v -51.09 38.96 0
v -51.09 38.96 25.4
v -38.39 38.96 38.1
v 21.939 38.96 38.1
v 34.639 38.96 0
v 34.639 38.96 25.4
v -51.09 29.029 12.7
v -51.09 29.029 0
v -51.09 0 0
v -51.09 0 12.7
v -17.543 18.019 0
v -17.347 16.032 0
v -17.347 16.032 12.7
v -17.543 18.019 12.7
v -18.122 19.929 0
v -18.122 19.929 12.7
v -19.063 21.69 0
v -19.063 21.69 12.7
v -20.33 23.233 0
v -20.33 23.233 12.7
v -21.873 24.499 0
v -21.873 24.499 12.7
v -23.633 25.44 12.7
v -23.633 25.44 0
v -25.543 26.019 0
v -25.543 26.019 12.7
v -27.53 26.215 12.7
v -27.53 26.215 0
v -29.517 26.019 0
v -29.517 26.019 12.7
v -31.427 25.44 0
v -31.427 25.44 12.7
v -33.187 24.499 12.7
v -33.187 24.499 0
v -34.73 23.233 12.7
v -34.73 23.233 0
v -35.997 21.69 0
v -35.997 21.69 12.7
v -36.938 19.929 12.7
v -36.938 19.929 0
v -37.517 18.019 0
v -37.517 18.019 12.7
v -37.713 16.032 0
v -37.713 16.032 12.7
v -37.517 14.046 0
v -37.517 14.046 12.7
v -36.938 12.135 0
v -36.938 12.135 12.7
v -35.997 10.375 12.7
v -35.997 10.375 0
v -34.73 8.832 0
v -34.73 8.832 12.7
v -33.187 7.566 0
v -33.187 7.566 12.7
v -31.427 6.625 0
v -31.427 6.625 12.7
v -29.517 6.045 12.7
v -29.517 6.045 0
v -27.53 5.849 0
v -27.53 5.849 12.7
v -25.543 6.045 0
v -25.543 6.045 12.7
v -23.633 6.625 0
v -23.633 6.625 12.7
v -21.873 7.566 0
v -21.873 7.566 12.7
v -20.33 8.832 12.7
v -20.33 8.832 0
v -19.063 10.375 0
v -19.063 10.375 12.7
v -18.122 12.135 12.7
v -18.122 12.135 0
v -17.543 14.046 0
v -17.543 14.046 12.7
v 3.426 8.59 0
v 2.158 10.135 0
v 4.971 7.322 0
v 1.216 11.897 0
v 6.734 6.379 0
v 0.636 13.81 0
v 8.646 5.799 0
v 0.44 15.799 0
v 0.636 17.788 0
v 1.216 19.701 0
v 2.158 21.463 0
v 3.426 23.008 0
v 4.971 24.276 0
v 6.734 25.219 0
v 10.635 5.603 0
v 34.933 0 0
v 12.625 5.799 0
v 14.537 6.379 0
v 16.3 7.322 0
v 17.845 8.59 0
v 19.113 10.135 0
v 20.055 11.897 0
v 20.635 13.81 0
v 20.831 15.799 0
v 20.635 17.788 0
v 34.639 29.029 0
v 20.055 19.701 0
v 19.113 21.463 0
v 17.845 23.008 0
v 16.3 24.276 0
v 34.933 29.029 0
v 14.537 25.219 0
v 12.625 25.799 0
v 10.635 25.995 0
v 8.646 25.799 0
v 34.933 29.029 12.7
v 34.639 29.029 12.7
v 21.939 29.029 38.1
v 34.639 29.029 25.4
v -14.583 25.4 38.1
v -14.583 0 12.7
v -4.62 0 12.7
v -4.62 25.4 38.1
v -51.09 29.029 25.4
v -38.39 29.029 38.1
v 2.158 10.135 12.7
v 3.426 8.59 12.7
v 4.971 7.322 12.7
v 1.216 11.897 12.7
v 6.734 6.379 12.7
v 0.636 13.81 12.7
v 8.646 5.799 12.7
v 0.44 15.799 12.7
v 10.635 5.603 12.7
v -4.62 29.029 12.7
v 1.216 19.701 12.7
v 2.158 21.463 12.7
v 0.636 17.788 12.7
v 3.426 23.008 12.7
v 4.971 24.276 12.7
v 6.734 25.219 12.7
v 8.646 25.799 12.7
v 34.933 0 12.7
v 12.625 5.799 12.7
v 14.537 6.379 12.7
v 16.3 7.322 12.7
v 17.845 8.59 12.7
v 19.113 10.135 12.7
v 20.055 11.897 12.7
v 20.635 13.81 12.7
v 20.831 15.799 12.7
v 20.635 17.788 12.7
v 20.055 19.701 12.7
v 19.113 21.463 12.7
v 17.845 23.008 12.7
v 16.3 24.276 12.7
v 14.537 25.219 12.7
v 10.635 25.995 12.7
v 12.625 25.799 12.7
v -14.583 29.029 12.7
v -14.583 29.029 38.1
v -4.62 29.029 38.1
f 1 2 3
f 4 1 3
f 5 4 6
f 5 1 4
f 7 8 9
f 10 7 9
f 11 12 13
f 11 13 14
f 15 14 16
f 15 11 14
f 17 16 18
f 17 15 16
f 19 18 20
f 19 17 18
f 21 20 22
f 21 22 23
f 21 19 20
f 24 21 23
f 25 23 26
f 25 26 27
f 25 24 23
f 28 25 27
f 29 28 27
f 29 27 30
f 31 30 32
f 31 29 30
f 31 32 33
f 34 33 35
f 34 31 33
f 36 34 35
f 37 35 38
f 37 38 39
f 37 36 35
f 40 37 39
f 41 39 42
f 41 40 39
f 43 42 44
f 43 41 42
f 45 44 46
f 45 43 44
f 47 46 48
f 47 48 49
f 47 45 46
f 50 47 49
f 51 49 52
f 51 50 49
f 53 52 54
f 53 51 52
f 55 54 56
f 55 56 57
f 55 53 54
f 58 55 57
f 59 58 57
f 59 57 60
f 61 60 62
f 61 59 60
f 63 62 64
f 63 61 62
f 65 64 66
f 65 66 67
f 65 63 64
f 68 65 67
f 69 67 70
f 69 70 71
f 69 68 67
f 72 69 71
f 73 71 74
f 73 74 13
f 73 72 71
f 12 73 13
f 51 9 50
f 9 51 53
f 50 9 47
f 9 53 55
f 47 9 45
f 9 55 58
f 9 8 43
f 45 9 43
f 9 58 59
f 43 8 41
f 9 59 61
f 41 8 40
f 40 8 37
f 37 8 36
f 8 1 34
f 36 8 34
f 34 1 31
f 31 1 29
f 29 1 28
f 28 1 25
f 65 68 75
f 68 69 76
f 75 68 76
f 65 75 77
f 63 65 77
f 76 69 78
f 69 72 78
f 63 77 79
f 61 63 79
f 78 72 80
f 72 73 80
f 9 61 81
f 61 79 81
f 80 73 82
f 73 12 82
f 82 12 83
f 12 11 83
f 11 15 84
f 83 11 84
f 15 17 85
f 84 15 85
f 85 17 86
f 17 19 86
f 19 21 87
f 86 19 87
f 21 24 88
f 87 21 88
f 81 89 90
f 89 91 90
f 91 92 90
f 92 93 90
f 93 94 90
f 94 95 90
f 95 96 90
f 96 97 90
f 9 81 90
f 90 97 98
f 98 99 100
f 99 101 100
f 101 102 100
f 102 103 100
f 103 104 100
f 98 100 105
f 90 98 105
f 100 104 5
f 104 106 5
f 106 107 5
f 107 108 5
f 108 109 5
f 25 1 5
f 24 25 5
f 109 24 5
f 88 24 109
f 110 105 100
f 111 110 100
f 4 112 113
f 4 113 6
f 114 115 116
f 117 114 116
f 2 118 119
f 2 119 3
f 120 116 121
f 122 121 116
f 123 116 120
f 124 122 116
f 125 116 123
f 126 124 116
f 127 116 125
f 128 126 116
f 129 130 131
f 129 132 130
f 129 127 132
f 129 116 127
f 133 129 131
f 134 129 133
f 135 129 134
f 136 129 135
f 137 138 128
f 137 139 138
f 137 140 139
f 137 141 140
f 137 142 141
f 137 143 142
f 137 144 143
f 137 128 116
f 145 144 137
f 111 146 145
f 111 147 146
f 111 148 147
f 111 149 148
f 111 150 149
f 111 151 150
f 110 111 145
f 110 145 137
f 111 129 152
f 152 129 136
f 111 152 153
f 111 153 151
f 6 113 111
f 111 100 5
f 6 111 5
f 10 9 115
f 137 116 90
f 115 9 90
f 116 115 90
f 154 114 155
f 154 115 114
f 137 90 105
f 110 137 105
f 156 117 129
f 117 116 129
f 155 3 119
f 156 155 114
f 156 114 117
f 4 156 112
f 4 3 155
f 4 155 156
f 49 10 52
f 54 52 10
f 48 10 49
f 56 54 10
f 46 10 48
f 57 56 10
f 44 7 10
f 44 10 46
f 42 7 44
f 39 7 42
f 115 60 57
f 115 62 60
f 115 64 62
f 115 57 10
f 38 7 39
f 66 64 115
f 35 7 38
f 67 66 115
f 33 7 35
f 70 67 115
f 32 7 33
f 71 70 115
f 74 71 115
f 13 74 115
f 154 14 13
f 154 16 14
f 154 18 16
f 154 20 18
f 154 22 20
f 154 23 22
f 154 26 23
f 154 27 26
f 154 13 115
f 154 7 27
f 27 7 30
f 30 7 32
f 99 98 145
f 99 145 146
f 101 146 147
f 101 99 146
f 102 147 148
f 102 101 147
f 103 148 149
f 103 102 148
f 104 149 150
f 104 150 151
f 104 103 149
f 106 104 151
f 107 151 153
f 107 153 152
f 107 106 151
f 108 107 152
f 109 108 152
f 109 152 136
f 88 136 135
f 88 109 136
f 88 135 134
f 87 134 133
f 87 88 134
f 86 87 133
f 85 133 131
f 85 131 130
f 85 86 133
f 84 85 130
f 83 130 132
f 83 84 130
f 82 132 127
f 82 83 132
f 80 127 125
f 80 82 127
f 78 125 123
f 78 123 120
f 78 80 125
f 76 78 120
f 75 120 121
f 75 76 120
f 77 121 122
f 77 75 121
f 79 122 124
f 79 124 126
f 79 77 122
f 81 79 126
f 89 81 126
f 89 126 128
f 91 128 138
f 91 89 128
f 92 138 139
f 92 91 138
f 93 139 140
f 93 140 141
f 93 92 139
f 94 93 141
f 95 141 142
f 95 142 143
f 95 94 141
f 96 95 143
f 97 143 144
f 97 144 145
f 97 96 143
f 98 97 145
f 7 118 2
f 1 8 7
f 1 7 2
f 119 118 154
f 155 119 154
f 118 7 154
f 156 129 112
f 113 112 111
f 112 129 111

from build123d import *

# Parameters (mm, degrees)
F0_R     = 10.182819
F0_R_2   = 10.195674
F0_W     = 85.729957
F0_H     = 9.931274
F1_DEPTH = 12.7
F2_W     = 85.729957
F2_H     = 9.931274
F3_DEPTH = 25.4
F4_SIZE  = 12.7
F5_SIZE  = 12.7
F6_W     = 9.963379
F6_H     = 29.028814
F7_DEPTH = 25.4
F8_SIZE  = 25.4


with BuildPart() as f1:
    # F0 (on Top) → F1 (new body)
    with BuildSketch(Plane.XY):
        Polygon((-51.090479, 0), (34.932677, 0), (34.932677, 29.028814), (34.639478, 29.028814), (-51.090479, 29.028814), align=None)
        with Locations((-27.52999, 16.03223)):
            Circle(F0_R, mode=Mode.SUBTRACT)
        with Locations((10.635439, 15.799049)):
            Circle(F0_R_2, mode=Mode.SUBTRACT)
        with Locations((-8.2255, 33.994451)):
            Rectangle(F0_W, F0_H)
    extrude(amount=F1_DEPTH)

    # F2 (on face) → F3 (join)
    with BuildSketch(Plane.XY.offset(12.7)):
        with Locations((-8.2255, 33.994451)):
            Rectangle(F2_W, F2_H)
    extrude(amount=F3_DEPTH)

    # F4
    f4_edges = [f1.edges().sort_by_distance(p)[0] for p in [
        (34.639478, 33.994451, 38.1),
    ]]
    chamfer(f4_edges, length=F4_SIZE)

    # F5
    f5_edges = [f1.edges().sort_by_distance(p)[0] for p in [
        (-51.090479, 33.994451, 38.1),
    ]]
    chamfer(f5_edges, length=F5_SIZE)

    # F6 (on face) → F7 (join)
    with BuildSketch(Plane.XY.offset(12.7)):
        with Locations((-9.60124, 14.514407)):
            Rectangle(F6_W, F6_H)
    extrude(amount=F7_DEPTH)

    # F8
    f8_edges = [f1.edges().sort_by_distance(p)[0] for p in [
        (-9.601241, 0, 38.1),
    ]]
    chamfer(f8_edges, length=F8_SIZE)


solid = f1.part
